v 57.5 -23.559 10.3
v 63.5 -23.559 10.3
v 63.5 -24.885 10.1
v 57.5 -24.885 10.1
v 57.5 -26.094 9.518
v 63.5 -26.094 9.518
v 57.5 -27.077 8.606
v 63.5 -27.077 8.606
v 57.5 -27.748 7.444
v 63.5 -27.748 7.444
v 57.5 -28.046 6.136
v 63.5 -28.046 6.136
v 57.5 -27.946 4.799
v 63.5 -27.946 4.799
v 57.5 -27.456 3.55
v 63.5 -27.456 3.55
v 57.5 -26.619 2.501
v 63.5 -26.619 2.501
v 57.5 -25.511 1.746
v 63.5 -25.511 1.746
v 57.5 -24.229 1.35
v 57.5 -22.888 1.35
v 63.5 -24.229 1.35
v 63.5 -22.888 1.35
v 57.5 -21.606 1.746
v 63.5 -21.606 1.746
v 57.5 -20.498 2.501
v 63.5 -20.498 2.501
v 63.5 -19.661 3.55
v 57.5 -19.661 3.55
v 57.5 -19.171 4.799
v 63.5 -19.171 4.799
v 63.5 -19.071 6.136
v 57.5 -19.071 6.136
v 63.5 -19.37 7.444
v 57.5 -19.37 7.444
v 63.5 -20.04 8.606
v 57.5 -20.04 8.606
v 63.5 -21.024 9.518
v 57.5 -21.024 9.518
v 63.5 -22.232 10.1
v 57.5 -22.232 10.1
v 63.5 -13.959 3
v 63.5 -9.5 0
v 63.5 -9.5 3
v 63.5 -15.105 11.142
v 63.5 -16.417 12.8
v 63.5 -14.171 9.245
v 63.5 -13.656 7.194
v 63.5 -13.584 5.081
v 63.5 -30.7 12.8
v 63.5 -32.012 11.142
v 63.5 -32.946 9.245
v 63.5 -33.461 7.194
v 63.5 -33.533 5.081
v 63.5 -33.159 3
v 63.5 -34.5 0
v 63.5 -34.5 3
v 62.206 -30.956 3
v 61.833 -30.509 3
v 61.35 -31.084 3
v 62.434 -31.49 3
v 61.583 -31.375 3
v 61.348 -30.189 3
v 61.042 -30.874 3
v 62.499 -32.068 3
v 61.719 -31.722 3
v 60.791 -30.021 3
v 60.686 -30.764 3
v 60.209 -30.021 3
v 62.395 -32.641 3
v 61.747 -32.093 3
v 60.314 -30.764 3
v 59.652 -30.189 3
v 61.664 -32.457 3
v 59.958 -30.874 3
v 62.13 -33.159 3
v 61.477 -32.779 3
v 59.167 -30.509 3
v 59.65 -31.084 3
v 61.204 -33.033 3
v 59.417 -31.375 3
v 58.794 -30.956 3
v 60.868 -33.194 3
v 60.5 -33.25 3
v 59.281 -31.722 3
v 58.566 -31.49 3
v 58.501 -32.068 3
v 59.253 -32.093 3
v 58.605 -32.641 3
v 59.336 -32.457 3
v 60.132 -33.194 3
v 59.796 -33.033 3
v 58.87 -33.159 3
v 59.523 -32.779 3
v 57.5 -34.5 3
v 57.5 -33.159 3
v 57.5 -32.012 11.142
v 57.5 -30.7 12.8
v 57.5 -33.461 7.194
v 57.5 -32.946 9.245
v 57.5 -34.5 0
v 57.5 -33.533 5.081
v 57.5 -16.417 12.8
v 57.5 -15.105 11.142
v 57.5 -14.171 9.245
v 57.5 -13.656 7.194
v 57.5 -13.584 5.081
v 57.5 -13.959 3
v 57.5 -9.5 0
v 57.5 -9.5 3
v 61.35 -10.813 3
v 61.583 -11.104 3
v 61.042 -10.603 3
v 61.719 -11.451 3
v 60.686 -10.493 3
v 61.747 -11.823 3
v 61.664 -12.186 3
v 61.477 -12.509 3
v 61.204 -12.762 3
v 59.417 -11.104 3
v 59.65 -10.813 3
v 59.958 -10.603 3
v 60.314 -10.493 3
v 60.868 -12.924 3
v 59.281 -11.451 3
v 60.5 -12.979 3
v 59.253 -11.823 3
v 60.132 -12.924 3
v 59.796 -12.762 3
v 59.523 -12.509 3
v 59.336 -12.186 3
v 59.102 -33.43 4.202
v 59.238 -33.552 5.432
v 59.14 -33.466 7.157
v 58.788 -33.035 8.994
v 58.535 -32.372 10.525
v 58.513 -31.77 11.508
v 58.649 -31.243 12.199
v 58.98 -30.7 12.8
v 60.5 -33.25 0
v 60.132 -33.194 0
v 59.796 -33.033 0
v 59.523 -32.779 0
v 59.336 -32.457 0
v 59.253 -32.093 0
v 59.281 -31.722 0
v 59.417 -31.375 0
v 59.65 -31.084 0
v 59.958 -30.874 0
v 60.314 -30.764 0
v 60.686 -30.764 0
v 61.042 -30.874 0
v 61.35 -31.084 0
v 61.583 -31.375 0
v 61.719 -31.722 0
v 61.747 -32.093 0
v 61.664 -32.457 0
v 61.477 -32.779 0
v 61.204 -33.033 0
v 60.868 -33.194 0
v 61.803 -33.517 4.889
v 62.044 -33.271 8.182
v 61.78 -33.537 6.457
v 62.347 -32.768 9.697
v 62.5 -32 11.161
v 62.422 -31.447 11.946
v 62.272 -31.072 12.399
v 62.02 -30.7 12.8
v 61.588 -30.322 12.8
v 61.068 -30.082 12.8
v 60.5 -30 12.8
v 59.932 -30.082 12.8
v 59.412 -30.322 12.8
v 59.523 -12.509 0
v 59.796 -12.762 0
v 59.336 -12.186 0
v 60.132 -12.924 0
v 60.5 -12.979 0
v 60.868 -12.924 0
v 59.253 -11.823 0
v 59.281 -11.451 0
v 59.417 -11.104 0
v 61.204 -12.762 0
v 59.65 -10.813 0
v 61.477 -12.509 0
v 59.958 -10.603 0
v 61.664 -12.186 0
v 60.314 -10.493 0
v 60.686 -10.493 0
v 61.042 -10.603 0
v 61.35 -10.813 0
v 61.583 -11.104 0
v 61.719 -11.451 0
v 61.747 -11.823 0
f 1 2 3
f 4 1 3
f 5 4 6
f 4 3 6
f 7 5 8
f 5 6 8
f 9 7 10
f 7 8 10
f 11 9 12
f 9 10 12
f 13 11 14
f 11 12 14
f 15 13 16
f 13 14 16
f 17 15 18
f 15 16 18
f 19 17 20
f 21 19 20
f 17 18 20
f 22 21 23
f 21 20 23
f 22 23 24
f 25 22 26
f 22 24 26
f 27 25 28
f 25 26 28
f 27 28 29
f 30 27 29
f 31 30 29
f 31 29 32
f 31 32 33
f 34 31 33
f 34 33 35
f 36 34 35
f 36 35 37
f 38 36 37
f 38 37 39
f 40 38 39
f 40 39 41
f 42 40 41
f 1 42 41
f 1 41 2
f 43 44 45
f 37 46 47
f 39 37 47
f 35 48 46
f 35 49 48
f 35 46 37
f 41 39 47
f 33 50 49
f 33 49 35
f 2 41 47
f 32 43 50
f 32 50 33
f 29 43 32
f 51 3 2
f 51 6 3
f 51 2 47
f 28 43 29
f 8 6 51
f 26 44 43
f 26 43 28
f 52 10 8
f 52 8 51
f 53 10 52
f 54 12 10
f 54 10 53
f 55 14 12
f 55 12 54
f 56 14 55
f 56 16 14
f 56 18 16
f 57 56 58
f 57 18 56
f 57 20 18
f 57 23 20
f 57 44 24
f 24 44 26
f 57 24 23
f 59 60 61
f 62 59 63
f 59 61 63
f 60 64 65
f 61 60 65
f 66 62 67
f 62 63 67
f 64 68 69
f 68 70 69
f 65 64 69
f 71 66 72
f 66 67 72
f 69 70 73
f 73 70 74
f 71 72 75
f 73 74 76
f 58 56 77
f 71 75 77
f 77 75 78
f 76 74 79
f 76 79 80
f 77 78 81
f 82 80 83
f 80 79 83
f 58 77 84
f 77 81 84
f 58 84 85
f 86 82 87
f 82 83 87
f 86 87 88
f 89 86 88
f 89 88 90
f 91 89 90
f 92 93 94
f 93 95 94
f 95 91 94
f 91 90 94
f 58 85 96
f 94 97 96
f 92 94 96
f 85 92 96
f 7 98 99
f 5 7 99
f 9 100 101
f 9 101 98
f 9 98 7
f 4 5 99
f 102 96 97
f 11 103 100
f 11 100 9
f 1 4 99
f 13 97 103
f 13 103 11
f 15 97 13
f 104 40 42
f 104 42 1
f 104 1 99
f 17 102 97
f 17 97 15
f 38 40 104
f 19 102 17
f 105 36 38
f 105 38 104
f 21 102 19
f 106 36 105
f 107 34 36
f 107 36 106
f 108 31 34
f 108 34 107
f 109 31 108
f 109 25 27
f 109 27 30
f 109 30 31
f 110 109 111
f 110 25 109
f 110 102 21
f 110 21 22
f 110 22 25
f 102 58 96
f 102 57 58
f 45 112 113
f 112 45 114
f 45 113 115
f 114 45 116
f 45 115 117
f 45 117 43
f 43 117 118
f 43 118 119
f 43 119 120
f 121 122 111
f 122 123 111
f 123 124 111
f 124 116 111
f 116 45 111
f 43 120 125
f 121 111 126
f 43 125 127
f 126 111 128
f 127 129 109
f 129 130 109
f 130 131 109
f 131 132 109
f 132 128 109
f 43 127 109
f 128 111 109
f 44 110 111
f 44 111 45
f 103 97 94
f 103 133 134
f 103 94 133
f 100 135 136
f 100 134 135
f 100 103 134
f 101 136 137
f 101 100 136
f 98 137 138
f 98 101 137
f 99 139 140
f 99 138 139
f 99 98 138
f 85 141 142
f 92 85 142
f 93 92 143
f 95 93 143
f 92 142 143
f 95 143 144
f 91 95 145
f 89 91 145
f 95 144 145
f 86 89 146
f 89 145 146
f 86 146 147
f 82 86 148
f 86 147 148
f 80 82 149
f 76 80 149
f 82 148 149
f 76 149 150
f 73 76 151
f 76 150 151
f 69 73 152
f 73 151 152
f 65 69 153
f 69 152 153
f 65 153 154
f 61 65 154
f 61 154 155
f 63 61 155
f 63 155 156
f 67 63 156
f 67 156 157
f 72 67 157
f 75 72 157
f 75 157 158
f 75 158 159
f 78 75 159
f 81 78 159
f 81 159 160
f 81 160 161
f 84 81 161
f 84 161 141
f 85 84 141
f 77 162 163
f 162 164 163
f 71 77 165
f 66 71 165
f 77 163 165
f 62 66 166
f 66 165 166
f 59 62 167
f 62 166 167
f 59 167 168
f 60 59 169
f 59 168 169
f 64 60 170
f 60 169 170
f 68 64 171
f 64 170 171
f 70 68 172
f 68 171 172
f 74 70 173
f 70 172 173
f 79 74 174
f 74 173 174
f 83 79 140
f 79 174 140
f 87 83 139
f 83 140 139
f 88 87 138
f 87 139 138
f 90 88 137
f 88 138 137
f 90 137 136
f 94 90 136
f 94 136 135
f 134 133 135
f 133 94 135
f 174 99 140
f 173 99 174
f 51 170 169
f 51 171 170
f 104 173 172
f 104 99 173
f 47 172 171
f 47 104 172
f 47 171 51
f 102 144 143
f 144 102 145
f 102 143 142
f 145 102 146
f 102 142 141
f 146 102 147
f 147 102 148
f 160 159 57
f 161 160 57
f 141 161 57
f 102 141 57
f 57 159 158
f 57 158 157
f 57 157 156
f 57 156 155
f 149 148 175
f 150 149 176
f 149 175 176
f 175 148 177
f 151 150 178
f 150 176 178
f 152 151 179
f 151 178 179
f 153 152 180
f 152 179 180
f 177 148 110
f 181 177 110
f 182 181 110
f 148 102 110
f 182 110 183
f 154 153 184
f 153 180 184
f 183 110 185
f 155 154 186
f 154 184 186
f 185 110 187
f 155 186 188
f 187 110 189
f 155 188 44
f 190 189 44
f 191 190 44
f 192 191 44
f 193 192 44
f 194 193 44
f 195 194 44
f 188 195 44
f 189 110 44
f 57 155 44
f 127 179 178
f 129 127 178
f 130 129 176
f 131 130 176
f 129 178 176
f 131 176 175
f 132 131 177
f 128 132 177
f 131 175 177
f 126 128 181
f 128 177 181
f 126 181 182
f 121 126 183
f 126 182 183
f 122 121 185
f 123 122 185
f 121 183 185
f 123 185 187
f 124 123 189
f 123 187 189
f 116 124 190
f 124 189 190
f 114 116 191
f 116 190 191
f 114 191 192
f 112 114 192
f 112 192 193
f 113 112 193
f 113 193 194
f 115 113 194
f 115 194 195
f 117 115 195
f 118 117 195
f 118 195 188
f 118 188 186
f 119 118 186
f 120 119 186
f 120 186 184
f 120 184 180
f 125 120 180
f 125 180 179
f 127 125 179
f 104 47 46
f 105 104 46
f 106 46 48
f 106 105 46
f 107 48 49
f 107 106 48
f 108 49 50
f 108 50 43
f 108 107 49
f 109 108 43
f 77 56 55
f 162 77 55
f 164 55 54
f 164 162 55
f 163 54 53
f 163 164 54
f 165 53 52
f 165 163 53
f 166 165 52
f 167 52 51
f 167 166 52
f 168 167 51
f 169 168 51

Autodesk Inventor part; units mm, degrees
ref_plane "YZ Plane" through (0, 0, 0) normal (1, 0, 0) x (0, 1, 0)
ref_plane "XZ Plane" through (0, 0, 0) normal (0, 1, 0) x (-1, 0, 0)
ref_plane "Plano de trabajo1" through (64.5, -49.5, 12.8) normal (0, 0, 1) x (1, 0, 0)
sketch "Boceto1" plane through (0, 0, 0) normal (0, 0, 1) x (1, 0, 0)
  line L0 (-63.5, 34.5) -> (63.5, 34.5)
  line L1 (63.5, -34.5) -> (-63.5, -34.5)
  line L2 (63.5, 34.5) -> (63.5, -34.5)
  line L3 (64.5, -16.5586) -> (64.5, -23.5586)
  line L4 (64.5, -23.5586) -> (64.5, -44.5)
  line L5 (64.5, -49.5) -> (64.5, -23.5586)
  line L6 (64.5, -16.5586) -> (64.5, -23.5586)
  line L7 (63.5, -34.5) -> (57.5, -34.5)
  line L8 (57.5, -34.5) -> (57.5, -9.5)
  line L9 (57.5, -9.5) -> (63.5, -9.5)
  line L10 (63.5, -9.5) -> (63.5, -34.5)
  point P0 (0, 0)
extrude "Extrusión1" add sketch "Boceto1" along normal up to surface (12.8 mm away)
sketch "Boceto2" plane through (57.5, -34.5, 0) normal (-1, 0, 0) x (0, 0, 1)
  line L0 (0, 0) -> (3, 0)
  line L1 (0, 25) -> (3, 25)
  line L2 (0, 25) -> (12.8, 25) projected
  line L3 (12.8, 0) -> (12.8, 25) projected
  arc A0 (12.8, 10.9414) -> (-1.2, 10.9414) centre (5.8, 10.9414) ccw projected
  arc A1 (12.8, 18.0828) -> (3, 20.5414) centre (5.8, 10.9414) ccw
  line L4 (3, 25) -> (3, 20.5414)
  line L5 (12.8, 0) -> (12.8, 5)
  line L6 (3, 1.3414) -> (3, 0)
  line L7 (3, 0) -> (12.8, 0)
  arc A2 (3, 1.3414) -> (12.8, 3.8) centre (5.8, 10.9414) ccw
  point P0 (0, 34.5)
  dimension "d4" = 3
  dimension "d6" = 3
  dimension "d8" = 3
  dimension "d9" = 5
extrude "Extrusión2" cut sketch "Boceto2" against normal up to surface (6 mm away)
hole "Agujero1" at (57.5, -23.5586, 5.8) direction (1, 0, 0) diameter 9 end up to surface
sketch "Boceto3" plane through (57.5, -34.5, 3) normal (0, 0, 1) x (1, 0, 0)
  line L0 (0, 5) -> (6, 5) projected
  line L1 (6, 0) -> (0, 0) projected
  line L2 (6, 25) -> (6, 20.5414) projected
  line L3 (0, 25) -> (6, 25) projected
  line L4 (0, 20.5414) -> (0, 25) projected
  line L5 (0, 20.5414) -> (6, 20.5414) projected
  line L6 (6, 5) -> (0, 0)
  line L7 (0, 20.5414) -> (6, 25)
  point P0 (-57.5, 34.5)
  point P1 (3, 22.7707)
  point P2 (3, 2.5)
hole "Agujero2" at (60.5, -11.7293, 3) at (60.5, -32, 3) direction (0, 0, -1) diameter 2.5 end up to surface
sketch "Boceto4" plane through (57.5, -16.4172, 12.8) normal (0, 0, 1) x (1, 0, 0)
  arc A0 (2.5308, -16.7414) -> (3.4692, -16.7414) centre (3, -15.5828) ccw projected
  circle A1 centre (3, -15.5828) radius 2
  point P0 (-57.5, 16.4172)
  dimension "d30" = 4
extrude "Extrusión3" cut sketch "Boceto4" against normal up to surface (9.8 mm away)
properties part number "soporteDerecho"
